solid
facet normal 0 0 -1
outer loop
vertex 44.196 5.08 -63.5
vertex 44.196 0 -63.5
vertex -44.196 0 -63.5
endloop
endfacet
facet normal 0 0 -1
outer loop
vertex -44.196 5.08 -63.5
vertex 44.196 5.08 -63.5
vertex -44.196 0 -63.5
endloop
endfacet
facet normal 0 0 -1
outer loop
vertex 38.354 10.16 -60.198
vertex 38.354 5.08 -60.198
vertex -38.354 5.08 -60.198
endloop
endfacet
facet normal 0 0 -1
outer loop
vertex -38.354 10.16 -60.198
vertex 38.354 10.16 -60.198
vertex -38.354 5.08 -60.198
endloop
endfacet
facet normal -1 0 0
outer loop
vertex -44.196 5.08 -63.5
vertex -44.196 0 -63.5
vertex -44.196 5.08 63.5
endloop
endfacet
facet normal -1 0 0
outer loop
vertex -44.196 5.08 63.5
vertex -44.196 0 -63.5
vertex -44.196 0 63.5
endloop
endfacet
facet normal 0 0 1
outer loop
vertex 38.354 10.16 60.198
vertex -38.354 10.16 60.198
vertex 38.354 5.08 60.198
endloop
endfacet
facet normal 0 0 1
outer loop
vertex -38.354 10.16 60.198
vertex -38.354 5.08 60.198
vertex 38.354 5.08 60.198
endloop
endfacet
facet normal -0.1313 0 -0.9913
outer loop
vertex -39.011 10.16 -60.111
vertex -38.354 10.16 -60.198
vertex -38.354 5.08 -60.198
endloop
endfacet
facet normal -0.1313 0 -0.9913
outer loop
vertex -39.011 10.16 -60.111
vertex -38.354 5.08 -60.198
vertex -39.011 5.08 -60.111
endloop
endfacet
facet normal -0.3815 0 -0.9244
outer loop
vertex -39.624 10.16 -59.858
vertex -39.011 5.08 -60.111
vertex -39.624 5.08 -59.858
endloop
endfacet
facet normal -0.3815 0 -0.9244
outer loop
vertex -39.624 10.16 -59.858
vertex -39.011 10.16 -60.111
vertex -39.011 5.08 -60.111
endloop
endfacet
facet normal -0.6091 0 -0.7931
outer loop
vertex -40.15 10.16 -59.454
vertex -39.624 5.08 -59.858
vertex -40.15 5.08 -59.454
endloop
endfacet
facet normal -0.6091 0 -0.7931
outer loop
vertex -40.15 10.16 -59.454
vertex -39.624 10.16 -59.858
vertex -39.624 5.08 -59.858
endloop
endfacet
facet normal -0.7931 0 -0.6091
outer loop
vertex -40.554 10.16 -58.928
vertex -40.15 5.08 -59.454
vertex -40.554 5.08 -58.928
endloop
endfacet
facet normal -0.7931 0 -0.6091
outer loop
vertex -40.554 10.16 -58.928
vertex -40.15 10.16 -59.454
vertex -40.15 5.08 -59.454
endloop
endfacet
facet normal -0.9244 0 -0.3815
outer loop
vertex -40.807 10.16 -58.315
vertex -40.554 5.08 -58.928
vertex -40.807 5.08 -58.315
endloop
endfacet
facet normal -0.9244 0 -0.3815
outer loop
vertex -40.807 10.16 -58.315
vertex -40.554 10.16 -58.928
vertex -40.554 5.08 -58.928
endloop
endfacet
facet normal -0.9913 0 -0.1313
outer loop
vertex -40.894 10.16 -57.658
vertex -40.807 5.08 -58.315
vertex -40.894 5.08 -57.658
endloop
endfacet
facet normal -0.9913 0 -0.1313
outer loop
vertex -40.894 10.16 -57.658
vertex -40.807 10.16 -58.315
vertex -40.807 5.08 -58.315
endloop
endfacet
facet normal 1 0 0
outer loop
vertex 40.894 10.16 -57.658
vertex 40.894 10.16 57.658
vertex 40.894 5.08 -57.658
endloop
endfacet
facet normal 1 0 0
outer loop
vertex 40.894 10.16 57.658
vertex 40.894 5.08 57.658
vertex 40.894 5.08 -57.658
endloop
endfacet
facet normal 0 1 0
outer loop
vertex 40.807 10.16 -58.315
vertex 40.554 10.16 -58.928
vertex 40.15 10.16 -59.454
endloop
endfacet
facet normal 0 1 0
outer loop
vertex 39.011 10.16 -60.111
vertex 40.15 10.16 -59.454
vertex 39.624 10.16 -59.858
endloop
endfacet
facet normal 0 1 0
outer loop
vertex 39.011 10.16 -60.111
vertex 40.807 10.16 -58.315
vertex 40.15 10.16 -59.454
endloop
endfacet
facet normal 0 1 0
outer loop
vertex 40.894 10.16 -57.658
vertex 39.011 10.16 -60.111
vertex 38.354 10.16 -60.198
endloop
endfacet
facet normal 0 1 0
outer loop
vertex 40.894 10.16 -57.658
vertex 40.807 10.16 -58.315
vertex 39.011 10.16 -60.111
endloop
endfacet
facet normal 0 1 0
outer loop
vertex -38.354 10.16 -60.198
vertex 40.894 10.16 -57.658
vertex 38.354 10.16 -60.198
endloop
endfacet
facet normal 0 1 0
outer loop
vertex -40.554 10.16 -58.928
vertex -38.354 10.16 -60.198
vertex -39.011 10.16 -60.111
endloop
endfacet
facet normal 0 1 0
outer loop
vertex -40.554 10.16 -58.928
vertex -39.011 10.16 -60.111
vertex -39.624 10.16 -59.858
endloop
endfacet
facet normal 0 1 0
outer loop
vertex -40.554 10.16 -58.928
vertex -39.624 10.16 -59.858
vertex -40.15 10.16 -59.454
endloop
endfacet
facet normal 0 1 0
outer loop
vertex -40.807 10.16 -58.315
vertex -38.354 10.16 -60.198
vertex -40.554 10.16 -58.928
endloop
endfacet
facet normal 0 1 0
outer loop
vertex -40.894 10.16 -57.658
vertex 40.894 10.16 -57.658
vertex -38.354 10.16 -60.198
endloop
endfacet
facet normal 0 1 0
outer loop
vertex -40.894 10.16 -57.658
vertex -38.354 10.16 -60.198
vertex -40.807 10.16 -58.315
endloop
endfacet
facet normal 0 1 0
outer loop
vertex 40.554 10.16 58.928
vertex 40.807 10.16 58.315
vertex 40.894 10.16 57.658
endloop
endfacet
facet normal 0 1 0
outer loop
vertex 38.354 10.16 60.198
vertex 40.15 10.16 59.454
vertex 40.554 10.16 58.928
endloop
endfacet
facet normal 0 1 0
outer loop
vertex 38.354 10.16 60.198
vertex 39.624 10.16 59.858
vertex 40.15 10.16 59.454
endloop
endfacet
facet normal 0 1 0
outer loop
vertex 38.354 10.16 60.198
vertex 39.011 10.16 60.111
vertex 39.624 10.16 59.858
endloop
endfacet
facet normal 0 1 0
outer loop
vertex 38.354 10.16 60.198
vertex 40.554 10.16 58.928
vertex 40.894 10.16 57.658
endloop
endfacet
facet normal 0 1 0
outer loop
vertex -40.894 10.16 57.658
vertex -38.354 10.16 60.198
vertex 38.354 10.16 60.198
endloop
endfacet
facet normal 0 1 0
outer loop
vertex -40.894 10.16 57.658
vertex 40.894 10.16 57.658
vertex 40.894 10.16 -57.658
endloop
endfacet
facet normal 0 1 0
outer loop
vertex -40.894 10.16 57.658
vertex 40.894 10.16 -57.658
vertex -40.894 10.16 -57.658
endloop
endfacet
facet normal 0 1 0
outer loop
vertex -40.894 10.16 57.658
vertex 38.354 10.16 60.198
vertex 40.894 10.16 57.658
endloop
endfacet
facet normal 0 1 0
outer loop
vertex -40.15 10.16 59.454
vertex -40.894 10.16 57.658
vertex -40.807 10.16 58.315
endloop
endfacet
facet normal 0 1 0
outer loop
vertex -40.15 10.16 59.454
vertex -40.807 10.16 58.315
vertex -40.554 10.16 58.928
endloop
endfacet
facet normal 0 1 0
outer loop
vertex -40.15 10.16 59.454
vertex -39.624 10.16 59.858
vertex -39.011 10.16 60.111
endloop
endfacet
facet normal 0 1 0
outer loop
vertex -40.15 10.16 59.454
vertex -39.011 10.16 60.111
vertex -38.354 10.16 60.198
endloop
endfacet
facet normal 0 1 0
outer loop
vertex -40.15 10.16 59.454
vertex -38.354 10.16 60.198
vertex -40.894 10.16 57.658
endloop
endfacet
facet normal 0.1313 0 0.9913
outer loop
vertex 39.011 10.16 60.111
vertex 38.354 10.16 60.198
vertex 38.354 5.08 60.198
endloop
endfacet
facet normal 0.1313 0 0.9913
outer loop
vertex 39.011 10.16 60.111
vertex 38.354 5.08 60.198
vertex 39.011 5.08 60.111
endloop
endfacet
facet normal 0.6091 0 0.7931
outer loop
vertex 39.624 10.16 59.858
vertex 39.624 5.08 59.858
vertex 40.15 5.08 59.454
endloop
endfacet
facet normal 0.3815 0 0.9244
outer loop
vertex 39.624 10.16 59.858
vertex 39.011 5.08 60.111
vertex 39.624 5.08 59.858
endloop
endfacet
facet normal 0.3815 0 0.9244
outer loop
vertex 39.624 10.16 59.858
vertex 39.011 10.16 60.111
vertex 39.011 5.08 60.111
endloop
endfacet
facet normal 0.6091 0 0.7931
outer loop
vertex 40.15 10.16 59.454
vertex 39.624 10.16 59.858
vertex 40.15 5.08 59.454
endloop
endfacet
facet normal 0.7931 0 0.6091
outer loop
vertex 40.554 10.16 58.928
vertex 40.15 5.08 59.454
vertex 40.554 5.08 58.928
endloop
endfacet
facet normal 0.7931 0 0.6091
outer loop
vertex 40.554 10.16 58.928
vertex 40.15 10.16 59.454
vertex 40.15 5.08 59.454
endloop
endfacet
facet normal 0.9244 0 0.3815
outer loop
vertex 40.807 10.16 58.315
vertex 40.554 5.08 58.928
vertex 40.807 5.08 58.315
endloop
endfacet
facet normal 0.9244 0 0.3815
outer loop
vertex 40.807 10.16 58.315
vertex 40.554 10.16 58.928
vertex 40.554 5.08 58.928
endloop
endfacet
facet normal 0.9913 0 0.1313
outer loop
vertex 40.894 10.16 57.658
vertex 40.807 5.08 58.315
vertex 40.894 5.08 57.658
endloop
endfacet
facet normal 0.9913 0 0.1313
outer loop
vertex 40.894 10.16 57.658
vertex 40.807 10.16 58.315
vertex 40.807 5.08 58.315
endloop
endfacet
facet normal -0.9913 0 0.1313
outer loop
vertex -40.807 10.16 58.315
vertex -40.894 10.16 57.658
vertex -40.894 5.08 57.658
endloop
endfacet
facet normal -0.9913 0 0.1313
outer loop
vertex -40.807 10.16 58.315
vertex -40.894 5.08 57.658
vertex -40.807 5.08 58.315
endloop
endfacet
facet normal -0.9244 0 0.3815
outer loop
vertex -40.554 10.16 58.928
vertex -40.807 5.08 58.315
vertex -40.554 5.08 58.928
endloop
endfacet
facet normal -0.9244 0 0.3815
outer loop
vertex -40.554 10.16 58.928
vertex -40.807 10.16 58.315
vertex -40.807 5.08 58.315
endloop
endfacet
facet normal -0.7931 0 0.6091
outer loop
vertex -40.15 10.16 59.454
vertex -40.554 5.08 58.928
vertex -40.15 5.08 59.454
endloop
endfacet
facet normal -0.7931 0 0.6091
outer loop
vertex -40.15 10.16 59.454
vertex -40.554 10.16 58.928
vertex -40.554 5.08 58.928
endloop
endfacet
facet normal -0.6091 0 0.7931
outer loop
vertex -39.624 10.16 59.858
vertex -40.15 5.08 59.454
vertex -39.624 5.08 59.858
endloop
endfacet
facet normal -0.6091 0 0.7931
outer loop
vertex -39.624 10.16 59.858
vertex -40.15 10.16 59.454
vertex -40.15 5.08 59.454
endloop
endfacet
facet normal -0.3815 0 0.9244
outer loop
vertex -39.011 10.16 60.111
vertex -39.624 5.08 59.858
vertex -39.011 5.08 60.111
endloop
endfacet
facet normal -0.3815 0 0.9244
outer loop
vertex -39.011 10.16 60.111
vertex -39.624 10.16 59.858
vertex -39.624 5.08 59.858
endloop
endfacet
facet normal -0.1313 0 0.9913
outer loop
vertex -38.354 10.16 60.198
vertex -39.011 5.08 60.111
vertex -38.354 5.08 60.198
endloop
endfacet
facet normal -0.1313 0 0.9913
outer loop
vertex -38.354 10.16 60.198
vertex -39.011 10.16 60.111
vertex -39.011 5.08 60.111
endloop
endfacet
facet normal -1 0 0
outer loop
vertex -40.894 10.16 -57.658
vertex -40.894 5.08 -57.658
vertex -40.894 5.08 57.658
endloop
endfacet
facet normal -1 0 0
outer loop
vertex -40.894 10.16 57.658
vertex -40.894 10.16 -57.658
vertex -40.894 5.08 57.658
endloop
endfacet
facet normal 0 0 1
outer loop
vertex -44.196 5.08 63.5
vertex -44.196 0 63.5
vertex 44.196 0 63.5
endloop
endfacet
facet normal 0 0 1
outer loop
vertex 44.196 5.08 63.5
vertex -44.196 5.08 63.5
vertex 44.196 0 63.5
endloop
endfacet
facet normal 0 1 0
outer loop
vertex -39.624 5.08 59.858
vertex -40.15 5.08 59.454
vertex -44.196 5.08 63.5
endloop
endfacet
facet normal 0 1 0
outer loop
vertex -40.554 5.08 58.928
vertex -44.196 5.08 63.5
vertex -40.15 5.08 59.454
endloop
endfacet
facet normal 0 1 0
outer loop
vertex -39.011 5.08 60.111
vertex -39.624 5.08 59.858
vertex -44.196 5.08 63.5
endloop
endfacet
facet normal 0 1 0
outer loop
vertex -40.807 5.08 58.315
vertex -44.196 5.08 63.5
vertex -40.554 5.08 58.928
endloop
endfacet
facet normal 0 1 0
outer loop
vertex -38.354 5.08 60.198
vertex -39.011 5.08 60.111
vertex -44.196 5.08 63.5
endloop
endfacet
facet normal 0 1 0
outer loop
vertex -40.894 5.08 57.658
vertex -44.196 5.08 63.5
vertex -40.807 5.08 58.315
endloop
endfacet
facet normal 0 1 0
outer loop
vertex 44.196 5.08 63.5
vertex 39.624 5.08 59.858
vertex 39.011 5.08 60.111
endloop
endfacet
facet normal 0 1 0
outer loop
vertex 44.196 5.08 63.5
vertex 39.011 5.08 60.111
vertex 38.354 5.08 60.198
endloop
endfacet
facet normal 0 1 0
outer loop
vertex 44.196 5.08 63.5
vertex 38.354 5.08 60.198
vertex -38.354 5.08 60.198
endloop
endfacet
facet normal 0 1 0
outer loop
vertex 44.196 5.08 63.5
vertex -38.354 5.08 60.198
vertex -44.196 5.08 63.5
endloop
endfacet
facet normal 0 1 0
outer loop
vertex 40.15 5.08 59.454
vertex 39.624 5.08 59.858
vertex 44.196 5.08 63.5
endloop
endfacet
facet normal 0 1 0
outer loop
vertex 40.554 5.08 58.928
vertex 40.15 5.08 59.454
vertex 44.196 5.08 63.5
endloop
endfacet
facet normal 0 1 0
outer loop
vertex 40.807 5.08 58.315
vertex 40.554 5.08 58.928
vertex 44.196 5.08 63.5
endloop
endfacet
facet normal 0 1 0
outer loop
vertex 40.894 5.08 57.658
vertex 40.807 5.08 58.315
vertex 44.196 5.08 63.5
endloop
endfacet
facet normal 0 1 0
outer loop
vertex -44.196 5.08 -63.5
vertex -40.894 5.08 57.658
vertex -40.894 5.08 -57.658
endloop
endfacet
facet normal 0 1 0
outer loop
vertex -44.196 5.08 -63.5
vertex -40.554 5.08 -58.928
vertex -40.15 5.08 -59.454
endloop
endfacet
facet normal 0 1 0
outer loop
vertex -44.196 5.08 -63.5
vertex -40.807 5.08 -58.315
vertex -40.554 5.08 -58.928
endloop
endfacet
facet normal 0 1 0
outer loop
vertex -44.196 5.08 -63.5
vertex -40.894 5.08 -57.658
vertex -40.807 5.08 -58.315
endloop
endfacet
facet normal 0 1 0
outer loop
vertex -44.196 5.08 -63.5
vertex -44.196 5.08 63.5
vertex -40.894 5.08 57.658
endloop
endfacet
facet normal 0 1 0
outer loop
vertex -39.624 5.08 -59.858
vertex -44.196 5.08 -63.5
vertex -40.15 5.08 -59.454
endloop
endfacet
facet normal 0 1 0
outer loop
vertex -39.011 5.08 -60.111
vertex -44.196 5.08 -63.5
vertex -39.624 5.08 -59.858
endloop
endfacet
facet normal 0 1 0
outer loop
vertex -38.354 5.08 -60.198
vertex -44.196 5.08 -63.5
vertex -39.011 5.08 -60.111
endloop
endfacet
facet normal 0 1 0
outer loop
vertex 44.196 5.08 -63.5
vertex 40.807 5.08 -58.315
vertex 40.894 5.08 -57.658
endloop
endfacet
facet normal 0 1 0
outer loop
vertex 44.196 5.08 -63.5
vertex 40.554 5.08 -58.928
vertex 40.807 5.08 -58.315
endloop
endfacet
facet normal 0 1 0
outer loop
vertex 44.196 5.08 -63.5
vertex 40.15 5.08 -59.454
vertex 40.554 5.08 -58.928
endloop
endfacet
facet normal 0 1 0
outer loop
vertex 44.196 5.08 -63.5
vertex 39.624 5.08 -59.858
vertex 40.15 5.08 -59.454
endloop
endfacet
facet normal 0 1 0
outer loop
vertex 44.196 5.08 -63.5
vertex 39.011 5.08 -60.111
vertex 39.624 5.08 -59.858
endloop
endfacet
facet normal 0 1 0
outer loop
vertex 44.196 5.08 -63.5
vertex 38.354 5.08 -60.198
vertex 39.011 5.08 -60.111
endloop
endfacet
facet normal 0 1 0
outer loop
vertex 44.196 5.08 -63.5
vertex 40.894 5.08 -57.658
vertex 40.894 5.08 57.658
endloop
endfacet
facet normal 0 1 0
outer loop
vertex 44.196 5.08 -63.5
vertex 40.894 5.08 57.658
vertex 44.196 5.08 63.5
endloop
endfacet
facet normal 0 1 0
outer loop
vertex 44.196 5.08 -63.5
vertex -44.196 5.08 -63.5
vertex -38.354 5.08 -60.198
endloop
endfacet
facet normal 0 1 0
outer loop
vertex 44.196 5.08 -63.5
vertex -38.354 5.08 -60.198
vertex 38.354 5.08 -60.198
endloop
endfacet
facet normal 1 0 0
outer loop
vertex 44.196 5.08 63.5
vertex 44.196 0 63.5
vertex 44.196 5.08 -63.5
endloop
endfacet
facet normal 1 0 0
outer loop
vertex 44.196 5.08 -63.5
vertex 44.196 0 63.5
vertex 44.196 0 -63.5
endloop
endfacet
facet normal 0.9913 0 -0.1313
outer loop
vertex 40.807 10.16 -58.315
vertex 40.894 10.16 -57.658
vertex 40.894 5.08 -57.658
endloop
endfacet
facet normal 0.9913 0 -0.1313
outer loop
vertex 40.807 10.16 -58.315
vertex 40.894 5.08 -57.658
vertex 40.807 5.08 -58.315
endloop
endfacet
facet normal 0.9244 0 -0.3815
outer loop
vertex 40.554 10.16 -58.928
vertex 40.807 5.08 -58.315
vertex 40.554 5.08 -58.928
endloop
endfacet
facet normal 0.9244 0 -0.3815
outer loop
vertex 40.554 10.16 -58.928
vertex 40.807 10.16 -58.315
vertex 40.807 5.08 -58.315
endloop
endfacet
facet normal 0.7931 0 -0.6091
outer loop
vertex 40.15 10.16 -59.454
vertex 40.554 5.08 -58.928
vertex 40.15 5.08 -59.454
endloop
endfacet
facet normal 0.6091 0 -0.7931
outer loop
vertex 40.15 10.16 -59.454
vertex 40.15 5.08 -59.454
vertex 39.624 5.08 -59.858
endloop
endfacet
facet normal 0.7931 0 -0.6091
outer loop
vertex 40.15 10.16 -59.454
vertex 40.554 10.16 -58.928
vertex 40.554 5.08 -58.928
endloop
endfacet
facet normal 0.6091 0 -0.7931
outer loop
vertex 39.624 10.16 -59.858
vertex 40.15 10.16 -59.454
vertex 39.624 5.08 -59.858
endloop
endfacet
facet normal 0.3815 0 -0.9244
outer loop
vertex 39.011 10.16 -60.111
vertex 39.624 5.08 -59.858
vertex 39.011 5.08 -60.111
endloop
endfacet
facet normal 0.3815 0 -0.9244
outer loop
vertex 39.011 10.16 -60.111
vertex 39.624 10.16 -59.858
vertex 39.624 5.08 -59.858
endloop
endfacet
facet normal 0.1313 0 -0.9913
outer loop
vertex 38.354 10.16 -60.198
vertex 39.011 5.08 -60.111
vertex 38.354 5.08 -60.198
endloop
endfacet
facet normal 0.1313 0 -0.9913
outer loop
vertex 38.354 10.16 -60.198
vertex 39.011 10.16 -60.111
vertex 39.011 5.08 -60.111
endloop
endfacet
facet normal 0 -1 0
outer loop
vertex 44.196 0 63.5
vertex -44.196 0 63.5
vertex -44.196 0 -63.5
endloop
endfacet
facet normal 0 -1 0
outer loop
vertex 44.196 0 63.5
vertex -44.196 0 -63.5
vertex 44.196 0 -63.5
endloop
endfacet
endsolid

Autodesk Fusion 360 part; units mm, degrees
sketch "Sketch1" plane through (0, 0, 0) normal (0, 1, 0) x (1, 0, 0) in component "Lid"
  line L0 (44.196, 63.5) -> (-44.196, 63.5)
  line L1 (-44.196, 63.5) -> (-44.196, -63.5)
  line L2 (-44.196, -63.5) -> (44.196, -63.5)
  line L3 (44.196, -63.5) -> (44.196, 63.5)
  line L4 (44.196, 63.5) -> (-44.196, -63.5) construction
  line L5 (-44.196, 63.5) -> (44.196, -63.5) construction
  dimension "d1" = 88.392
  dimension "d2" = 127
extrude "Extrude1" add sketch "Sketch1" along normal blind 5.08 in component "Lid"
sketch "Sketch3" plane through (0, 5.08, 0) normal (0, 1, 0) x (-1, 0, 0) in component "Lid"
  line L0 (-44.196, 63.5) -> (-44.196, -63.5)
  line L1 (-44.196, -63.5) -> (44.196, -63.5)
  line L2 (44.196, -63.5) -> (44.196, 63.5)
  line L3 (44.196, 63.5) -> (-44.196, 63.5)
  line L4 (-40.894, -60.198) -> (40.894, -60.198)
  line L5 (40.894, -60.198) -> (40.894, 60.198)
  line L6 (40.894, 60.198) -> (-40.894, 60.198)
  line L7 (-40.894, 60.198) -> (-40.894, -60.198)
  line L8 (-40.894, -60.198) -> (40.894, 60.198) construction
  line L9 (40.894, -60.198) -> (-40.894, 60.198) construction
  dimension "d6" = 81.788
  dimension "d7" = 120.396
extrude "Extrude2" add sketch "Sketch3" along normal blind 5.08 contours L4 L5 L6 L7 in component "Lid"
fillet "Fillet1" radius 2.54 4 edges at (-40.894, 7.62, -60.198) (40.894, 7.62, -60.198) (40.894, 7.62, 60.198) (-40.894, 7.62, 60.198) in component "Lid"
component "Lid" placed x (1, 0, 0) y (0, 1, 0) z (0, 0, 1) at (0, 0, 0)
